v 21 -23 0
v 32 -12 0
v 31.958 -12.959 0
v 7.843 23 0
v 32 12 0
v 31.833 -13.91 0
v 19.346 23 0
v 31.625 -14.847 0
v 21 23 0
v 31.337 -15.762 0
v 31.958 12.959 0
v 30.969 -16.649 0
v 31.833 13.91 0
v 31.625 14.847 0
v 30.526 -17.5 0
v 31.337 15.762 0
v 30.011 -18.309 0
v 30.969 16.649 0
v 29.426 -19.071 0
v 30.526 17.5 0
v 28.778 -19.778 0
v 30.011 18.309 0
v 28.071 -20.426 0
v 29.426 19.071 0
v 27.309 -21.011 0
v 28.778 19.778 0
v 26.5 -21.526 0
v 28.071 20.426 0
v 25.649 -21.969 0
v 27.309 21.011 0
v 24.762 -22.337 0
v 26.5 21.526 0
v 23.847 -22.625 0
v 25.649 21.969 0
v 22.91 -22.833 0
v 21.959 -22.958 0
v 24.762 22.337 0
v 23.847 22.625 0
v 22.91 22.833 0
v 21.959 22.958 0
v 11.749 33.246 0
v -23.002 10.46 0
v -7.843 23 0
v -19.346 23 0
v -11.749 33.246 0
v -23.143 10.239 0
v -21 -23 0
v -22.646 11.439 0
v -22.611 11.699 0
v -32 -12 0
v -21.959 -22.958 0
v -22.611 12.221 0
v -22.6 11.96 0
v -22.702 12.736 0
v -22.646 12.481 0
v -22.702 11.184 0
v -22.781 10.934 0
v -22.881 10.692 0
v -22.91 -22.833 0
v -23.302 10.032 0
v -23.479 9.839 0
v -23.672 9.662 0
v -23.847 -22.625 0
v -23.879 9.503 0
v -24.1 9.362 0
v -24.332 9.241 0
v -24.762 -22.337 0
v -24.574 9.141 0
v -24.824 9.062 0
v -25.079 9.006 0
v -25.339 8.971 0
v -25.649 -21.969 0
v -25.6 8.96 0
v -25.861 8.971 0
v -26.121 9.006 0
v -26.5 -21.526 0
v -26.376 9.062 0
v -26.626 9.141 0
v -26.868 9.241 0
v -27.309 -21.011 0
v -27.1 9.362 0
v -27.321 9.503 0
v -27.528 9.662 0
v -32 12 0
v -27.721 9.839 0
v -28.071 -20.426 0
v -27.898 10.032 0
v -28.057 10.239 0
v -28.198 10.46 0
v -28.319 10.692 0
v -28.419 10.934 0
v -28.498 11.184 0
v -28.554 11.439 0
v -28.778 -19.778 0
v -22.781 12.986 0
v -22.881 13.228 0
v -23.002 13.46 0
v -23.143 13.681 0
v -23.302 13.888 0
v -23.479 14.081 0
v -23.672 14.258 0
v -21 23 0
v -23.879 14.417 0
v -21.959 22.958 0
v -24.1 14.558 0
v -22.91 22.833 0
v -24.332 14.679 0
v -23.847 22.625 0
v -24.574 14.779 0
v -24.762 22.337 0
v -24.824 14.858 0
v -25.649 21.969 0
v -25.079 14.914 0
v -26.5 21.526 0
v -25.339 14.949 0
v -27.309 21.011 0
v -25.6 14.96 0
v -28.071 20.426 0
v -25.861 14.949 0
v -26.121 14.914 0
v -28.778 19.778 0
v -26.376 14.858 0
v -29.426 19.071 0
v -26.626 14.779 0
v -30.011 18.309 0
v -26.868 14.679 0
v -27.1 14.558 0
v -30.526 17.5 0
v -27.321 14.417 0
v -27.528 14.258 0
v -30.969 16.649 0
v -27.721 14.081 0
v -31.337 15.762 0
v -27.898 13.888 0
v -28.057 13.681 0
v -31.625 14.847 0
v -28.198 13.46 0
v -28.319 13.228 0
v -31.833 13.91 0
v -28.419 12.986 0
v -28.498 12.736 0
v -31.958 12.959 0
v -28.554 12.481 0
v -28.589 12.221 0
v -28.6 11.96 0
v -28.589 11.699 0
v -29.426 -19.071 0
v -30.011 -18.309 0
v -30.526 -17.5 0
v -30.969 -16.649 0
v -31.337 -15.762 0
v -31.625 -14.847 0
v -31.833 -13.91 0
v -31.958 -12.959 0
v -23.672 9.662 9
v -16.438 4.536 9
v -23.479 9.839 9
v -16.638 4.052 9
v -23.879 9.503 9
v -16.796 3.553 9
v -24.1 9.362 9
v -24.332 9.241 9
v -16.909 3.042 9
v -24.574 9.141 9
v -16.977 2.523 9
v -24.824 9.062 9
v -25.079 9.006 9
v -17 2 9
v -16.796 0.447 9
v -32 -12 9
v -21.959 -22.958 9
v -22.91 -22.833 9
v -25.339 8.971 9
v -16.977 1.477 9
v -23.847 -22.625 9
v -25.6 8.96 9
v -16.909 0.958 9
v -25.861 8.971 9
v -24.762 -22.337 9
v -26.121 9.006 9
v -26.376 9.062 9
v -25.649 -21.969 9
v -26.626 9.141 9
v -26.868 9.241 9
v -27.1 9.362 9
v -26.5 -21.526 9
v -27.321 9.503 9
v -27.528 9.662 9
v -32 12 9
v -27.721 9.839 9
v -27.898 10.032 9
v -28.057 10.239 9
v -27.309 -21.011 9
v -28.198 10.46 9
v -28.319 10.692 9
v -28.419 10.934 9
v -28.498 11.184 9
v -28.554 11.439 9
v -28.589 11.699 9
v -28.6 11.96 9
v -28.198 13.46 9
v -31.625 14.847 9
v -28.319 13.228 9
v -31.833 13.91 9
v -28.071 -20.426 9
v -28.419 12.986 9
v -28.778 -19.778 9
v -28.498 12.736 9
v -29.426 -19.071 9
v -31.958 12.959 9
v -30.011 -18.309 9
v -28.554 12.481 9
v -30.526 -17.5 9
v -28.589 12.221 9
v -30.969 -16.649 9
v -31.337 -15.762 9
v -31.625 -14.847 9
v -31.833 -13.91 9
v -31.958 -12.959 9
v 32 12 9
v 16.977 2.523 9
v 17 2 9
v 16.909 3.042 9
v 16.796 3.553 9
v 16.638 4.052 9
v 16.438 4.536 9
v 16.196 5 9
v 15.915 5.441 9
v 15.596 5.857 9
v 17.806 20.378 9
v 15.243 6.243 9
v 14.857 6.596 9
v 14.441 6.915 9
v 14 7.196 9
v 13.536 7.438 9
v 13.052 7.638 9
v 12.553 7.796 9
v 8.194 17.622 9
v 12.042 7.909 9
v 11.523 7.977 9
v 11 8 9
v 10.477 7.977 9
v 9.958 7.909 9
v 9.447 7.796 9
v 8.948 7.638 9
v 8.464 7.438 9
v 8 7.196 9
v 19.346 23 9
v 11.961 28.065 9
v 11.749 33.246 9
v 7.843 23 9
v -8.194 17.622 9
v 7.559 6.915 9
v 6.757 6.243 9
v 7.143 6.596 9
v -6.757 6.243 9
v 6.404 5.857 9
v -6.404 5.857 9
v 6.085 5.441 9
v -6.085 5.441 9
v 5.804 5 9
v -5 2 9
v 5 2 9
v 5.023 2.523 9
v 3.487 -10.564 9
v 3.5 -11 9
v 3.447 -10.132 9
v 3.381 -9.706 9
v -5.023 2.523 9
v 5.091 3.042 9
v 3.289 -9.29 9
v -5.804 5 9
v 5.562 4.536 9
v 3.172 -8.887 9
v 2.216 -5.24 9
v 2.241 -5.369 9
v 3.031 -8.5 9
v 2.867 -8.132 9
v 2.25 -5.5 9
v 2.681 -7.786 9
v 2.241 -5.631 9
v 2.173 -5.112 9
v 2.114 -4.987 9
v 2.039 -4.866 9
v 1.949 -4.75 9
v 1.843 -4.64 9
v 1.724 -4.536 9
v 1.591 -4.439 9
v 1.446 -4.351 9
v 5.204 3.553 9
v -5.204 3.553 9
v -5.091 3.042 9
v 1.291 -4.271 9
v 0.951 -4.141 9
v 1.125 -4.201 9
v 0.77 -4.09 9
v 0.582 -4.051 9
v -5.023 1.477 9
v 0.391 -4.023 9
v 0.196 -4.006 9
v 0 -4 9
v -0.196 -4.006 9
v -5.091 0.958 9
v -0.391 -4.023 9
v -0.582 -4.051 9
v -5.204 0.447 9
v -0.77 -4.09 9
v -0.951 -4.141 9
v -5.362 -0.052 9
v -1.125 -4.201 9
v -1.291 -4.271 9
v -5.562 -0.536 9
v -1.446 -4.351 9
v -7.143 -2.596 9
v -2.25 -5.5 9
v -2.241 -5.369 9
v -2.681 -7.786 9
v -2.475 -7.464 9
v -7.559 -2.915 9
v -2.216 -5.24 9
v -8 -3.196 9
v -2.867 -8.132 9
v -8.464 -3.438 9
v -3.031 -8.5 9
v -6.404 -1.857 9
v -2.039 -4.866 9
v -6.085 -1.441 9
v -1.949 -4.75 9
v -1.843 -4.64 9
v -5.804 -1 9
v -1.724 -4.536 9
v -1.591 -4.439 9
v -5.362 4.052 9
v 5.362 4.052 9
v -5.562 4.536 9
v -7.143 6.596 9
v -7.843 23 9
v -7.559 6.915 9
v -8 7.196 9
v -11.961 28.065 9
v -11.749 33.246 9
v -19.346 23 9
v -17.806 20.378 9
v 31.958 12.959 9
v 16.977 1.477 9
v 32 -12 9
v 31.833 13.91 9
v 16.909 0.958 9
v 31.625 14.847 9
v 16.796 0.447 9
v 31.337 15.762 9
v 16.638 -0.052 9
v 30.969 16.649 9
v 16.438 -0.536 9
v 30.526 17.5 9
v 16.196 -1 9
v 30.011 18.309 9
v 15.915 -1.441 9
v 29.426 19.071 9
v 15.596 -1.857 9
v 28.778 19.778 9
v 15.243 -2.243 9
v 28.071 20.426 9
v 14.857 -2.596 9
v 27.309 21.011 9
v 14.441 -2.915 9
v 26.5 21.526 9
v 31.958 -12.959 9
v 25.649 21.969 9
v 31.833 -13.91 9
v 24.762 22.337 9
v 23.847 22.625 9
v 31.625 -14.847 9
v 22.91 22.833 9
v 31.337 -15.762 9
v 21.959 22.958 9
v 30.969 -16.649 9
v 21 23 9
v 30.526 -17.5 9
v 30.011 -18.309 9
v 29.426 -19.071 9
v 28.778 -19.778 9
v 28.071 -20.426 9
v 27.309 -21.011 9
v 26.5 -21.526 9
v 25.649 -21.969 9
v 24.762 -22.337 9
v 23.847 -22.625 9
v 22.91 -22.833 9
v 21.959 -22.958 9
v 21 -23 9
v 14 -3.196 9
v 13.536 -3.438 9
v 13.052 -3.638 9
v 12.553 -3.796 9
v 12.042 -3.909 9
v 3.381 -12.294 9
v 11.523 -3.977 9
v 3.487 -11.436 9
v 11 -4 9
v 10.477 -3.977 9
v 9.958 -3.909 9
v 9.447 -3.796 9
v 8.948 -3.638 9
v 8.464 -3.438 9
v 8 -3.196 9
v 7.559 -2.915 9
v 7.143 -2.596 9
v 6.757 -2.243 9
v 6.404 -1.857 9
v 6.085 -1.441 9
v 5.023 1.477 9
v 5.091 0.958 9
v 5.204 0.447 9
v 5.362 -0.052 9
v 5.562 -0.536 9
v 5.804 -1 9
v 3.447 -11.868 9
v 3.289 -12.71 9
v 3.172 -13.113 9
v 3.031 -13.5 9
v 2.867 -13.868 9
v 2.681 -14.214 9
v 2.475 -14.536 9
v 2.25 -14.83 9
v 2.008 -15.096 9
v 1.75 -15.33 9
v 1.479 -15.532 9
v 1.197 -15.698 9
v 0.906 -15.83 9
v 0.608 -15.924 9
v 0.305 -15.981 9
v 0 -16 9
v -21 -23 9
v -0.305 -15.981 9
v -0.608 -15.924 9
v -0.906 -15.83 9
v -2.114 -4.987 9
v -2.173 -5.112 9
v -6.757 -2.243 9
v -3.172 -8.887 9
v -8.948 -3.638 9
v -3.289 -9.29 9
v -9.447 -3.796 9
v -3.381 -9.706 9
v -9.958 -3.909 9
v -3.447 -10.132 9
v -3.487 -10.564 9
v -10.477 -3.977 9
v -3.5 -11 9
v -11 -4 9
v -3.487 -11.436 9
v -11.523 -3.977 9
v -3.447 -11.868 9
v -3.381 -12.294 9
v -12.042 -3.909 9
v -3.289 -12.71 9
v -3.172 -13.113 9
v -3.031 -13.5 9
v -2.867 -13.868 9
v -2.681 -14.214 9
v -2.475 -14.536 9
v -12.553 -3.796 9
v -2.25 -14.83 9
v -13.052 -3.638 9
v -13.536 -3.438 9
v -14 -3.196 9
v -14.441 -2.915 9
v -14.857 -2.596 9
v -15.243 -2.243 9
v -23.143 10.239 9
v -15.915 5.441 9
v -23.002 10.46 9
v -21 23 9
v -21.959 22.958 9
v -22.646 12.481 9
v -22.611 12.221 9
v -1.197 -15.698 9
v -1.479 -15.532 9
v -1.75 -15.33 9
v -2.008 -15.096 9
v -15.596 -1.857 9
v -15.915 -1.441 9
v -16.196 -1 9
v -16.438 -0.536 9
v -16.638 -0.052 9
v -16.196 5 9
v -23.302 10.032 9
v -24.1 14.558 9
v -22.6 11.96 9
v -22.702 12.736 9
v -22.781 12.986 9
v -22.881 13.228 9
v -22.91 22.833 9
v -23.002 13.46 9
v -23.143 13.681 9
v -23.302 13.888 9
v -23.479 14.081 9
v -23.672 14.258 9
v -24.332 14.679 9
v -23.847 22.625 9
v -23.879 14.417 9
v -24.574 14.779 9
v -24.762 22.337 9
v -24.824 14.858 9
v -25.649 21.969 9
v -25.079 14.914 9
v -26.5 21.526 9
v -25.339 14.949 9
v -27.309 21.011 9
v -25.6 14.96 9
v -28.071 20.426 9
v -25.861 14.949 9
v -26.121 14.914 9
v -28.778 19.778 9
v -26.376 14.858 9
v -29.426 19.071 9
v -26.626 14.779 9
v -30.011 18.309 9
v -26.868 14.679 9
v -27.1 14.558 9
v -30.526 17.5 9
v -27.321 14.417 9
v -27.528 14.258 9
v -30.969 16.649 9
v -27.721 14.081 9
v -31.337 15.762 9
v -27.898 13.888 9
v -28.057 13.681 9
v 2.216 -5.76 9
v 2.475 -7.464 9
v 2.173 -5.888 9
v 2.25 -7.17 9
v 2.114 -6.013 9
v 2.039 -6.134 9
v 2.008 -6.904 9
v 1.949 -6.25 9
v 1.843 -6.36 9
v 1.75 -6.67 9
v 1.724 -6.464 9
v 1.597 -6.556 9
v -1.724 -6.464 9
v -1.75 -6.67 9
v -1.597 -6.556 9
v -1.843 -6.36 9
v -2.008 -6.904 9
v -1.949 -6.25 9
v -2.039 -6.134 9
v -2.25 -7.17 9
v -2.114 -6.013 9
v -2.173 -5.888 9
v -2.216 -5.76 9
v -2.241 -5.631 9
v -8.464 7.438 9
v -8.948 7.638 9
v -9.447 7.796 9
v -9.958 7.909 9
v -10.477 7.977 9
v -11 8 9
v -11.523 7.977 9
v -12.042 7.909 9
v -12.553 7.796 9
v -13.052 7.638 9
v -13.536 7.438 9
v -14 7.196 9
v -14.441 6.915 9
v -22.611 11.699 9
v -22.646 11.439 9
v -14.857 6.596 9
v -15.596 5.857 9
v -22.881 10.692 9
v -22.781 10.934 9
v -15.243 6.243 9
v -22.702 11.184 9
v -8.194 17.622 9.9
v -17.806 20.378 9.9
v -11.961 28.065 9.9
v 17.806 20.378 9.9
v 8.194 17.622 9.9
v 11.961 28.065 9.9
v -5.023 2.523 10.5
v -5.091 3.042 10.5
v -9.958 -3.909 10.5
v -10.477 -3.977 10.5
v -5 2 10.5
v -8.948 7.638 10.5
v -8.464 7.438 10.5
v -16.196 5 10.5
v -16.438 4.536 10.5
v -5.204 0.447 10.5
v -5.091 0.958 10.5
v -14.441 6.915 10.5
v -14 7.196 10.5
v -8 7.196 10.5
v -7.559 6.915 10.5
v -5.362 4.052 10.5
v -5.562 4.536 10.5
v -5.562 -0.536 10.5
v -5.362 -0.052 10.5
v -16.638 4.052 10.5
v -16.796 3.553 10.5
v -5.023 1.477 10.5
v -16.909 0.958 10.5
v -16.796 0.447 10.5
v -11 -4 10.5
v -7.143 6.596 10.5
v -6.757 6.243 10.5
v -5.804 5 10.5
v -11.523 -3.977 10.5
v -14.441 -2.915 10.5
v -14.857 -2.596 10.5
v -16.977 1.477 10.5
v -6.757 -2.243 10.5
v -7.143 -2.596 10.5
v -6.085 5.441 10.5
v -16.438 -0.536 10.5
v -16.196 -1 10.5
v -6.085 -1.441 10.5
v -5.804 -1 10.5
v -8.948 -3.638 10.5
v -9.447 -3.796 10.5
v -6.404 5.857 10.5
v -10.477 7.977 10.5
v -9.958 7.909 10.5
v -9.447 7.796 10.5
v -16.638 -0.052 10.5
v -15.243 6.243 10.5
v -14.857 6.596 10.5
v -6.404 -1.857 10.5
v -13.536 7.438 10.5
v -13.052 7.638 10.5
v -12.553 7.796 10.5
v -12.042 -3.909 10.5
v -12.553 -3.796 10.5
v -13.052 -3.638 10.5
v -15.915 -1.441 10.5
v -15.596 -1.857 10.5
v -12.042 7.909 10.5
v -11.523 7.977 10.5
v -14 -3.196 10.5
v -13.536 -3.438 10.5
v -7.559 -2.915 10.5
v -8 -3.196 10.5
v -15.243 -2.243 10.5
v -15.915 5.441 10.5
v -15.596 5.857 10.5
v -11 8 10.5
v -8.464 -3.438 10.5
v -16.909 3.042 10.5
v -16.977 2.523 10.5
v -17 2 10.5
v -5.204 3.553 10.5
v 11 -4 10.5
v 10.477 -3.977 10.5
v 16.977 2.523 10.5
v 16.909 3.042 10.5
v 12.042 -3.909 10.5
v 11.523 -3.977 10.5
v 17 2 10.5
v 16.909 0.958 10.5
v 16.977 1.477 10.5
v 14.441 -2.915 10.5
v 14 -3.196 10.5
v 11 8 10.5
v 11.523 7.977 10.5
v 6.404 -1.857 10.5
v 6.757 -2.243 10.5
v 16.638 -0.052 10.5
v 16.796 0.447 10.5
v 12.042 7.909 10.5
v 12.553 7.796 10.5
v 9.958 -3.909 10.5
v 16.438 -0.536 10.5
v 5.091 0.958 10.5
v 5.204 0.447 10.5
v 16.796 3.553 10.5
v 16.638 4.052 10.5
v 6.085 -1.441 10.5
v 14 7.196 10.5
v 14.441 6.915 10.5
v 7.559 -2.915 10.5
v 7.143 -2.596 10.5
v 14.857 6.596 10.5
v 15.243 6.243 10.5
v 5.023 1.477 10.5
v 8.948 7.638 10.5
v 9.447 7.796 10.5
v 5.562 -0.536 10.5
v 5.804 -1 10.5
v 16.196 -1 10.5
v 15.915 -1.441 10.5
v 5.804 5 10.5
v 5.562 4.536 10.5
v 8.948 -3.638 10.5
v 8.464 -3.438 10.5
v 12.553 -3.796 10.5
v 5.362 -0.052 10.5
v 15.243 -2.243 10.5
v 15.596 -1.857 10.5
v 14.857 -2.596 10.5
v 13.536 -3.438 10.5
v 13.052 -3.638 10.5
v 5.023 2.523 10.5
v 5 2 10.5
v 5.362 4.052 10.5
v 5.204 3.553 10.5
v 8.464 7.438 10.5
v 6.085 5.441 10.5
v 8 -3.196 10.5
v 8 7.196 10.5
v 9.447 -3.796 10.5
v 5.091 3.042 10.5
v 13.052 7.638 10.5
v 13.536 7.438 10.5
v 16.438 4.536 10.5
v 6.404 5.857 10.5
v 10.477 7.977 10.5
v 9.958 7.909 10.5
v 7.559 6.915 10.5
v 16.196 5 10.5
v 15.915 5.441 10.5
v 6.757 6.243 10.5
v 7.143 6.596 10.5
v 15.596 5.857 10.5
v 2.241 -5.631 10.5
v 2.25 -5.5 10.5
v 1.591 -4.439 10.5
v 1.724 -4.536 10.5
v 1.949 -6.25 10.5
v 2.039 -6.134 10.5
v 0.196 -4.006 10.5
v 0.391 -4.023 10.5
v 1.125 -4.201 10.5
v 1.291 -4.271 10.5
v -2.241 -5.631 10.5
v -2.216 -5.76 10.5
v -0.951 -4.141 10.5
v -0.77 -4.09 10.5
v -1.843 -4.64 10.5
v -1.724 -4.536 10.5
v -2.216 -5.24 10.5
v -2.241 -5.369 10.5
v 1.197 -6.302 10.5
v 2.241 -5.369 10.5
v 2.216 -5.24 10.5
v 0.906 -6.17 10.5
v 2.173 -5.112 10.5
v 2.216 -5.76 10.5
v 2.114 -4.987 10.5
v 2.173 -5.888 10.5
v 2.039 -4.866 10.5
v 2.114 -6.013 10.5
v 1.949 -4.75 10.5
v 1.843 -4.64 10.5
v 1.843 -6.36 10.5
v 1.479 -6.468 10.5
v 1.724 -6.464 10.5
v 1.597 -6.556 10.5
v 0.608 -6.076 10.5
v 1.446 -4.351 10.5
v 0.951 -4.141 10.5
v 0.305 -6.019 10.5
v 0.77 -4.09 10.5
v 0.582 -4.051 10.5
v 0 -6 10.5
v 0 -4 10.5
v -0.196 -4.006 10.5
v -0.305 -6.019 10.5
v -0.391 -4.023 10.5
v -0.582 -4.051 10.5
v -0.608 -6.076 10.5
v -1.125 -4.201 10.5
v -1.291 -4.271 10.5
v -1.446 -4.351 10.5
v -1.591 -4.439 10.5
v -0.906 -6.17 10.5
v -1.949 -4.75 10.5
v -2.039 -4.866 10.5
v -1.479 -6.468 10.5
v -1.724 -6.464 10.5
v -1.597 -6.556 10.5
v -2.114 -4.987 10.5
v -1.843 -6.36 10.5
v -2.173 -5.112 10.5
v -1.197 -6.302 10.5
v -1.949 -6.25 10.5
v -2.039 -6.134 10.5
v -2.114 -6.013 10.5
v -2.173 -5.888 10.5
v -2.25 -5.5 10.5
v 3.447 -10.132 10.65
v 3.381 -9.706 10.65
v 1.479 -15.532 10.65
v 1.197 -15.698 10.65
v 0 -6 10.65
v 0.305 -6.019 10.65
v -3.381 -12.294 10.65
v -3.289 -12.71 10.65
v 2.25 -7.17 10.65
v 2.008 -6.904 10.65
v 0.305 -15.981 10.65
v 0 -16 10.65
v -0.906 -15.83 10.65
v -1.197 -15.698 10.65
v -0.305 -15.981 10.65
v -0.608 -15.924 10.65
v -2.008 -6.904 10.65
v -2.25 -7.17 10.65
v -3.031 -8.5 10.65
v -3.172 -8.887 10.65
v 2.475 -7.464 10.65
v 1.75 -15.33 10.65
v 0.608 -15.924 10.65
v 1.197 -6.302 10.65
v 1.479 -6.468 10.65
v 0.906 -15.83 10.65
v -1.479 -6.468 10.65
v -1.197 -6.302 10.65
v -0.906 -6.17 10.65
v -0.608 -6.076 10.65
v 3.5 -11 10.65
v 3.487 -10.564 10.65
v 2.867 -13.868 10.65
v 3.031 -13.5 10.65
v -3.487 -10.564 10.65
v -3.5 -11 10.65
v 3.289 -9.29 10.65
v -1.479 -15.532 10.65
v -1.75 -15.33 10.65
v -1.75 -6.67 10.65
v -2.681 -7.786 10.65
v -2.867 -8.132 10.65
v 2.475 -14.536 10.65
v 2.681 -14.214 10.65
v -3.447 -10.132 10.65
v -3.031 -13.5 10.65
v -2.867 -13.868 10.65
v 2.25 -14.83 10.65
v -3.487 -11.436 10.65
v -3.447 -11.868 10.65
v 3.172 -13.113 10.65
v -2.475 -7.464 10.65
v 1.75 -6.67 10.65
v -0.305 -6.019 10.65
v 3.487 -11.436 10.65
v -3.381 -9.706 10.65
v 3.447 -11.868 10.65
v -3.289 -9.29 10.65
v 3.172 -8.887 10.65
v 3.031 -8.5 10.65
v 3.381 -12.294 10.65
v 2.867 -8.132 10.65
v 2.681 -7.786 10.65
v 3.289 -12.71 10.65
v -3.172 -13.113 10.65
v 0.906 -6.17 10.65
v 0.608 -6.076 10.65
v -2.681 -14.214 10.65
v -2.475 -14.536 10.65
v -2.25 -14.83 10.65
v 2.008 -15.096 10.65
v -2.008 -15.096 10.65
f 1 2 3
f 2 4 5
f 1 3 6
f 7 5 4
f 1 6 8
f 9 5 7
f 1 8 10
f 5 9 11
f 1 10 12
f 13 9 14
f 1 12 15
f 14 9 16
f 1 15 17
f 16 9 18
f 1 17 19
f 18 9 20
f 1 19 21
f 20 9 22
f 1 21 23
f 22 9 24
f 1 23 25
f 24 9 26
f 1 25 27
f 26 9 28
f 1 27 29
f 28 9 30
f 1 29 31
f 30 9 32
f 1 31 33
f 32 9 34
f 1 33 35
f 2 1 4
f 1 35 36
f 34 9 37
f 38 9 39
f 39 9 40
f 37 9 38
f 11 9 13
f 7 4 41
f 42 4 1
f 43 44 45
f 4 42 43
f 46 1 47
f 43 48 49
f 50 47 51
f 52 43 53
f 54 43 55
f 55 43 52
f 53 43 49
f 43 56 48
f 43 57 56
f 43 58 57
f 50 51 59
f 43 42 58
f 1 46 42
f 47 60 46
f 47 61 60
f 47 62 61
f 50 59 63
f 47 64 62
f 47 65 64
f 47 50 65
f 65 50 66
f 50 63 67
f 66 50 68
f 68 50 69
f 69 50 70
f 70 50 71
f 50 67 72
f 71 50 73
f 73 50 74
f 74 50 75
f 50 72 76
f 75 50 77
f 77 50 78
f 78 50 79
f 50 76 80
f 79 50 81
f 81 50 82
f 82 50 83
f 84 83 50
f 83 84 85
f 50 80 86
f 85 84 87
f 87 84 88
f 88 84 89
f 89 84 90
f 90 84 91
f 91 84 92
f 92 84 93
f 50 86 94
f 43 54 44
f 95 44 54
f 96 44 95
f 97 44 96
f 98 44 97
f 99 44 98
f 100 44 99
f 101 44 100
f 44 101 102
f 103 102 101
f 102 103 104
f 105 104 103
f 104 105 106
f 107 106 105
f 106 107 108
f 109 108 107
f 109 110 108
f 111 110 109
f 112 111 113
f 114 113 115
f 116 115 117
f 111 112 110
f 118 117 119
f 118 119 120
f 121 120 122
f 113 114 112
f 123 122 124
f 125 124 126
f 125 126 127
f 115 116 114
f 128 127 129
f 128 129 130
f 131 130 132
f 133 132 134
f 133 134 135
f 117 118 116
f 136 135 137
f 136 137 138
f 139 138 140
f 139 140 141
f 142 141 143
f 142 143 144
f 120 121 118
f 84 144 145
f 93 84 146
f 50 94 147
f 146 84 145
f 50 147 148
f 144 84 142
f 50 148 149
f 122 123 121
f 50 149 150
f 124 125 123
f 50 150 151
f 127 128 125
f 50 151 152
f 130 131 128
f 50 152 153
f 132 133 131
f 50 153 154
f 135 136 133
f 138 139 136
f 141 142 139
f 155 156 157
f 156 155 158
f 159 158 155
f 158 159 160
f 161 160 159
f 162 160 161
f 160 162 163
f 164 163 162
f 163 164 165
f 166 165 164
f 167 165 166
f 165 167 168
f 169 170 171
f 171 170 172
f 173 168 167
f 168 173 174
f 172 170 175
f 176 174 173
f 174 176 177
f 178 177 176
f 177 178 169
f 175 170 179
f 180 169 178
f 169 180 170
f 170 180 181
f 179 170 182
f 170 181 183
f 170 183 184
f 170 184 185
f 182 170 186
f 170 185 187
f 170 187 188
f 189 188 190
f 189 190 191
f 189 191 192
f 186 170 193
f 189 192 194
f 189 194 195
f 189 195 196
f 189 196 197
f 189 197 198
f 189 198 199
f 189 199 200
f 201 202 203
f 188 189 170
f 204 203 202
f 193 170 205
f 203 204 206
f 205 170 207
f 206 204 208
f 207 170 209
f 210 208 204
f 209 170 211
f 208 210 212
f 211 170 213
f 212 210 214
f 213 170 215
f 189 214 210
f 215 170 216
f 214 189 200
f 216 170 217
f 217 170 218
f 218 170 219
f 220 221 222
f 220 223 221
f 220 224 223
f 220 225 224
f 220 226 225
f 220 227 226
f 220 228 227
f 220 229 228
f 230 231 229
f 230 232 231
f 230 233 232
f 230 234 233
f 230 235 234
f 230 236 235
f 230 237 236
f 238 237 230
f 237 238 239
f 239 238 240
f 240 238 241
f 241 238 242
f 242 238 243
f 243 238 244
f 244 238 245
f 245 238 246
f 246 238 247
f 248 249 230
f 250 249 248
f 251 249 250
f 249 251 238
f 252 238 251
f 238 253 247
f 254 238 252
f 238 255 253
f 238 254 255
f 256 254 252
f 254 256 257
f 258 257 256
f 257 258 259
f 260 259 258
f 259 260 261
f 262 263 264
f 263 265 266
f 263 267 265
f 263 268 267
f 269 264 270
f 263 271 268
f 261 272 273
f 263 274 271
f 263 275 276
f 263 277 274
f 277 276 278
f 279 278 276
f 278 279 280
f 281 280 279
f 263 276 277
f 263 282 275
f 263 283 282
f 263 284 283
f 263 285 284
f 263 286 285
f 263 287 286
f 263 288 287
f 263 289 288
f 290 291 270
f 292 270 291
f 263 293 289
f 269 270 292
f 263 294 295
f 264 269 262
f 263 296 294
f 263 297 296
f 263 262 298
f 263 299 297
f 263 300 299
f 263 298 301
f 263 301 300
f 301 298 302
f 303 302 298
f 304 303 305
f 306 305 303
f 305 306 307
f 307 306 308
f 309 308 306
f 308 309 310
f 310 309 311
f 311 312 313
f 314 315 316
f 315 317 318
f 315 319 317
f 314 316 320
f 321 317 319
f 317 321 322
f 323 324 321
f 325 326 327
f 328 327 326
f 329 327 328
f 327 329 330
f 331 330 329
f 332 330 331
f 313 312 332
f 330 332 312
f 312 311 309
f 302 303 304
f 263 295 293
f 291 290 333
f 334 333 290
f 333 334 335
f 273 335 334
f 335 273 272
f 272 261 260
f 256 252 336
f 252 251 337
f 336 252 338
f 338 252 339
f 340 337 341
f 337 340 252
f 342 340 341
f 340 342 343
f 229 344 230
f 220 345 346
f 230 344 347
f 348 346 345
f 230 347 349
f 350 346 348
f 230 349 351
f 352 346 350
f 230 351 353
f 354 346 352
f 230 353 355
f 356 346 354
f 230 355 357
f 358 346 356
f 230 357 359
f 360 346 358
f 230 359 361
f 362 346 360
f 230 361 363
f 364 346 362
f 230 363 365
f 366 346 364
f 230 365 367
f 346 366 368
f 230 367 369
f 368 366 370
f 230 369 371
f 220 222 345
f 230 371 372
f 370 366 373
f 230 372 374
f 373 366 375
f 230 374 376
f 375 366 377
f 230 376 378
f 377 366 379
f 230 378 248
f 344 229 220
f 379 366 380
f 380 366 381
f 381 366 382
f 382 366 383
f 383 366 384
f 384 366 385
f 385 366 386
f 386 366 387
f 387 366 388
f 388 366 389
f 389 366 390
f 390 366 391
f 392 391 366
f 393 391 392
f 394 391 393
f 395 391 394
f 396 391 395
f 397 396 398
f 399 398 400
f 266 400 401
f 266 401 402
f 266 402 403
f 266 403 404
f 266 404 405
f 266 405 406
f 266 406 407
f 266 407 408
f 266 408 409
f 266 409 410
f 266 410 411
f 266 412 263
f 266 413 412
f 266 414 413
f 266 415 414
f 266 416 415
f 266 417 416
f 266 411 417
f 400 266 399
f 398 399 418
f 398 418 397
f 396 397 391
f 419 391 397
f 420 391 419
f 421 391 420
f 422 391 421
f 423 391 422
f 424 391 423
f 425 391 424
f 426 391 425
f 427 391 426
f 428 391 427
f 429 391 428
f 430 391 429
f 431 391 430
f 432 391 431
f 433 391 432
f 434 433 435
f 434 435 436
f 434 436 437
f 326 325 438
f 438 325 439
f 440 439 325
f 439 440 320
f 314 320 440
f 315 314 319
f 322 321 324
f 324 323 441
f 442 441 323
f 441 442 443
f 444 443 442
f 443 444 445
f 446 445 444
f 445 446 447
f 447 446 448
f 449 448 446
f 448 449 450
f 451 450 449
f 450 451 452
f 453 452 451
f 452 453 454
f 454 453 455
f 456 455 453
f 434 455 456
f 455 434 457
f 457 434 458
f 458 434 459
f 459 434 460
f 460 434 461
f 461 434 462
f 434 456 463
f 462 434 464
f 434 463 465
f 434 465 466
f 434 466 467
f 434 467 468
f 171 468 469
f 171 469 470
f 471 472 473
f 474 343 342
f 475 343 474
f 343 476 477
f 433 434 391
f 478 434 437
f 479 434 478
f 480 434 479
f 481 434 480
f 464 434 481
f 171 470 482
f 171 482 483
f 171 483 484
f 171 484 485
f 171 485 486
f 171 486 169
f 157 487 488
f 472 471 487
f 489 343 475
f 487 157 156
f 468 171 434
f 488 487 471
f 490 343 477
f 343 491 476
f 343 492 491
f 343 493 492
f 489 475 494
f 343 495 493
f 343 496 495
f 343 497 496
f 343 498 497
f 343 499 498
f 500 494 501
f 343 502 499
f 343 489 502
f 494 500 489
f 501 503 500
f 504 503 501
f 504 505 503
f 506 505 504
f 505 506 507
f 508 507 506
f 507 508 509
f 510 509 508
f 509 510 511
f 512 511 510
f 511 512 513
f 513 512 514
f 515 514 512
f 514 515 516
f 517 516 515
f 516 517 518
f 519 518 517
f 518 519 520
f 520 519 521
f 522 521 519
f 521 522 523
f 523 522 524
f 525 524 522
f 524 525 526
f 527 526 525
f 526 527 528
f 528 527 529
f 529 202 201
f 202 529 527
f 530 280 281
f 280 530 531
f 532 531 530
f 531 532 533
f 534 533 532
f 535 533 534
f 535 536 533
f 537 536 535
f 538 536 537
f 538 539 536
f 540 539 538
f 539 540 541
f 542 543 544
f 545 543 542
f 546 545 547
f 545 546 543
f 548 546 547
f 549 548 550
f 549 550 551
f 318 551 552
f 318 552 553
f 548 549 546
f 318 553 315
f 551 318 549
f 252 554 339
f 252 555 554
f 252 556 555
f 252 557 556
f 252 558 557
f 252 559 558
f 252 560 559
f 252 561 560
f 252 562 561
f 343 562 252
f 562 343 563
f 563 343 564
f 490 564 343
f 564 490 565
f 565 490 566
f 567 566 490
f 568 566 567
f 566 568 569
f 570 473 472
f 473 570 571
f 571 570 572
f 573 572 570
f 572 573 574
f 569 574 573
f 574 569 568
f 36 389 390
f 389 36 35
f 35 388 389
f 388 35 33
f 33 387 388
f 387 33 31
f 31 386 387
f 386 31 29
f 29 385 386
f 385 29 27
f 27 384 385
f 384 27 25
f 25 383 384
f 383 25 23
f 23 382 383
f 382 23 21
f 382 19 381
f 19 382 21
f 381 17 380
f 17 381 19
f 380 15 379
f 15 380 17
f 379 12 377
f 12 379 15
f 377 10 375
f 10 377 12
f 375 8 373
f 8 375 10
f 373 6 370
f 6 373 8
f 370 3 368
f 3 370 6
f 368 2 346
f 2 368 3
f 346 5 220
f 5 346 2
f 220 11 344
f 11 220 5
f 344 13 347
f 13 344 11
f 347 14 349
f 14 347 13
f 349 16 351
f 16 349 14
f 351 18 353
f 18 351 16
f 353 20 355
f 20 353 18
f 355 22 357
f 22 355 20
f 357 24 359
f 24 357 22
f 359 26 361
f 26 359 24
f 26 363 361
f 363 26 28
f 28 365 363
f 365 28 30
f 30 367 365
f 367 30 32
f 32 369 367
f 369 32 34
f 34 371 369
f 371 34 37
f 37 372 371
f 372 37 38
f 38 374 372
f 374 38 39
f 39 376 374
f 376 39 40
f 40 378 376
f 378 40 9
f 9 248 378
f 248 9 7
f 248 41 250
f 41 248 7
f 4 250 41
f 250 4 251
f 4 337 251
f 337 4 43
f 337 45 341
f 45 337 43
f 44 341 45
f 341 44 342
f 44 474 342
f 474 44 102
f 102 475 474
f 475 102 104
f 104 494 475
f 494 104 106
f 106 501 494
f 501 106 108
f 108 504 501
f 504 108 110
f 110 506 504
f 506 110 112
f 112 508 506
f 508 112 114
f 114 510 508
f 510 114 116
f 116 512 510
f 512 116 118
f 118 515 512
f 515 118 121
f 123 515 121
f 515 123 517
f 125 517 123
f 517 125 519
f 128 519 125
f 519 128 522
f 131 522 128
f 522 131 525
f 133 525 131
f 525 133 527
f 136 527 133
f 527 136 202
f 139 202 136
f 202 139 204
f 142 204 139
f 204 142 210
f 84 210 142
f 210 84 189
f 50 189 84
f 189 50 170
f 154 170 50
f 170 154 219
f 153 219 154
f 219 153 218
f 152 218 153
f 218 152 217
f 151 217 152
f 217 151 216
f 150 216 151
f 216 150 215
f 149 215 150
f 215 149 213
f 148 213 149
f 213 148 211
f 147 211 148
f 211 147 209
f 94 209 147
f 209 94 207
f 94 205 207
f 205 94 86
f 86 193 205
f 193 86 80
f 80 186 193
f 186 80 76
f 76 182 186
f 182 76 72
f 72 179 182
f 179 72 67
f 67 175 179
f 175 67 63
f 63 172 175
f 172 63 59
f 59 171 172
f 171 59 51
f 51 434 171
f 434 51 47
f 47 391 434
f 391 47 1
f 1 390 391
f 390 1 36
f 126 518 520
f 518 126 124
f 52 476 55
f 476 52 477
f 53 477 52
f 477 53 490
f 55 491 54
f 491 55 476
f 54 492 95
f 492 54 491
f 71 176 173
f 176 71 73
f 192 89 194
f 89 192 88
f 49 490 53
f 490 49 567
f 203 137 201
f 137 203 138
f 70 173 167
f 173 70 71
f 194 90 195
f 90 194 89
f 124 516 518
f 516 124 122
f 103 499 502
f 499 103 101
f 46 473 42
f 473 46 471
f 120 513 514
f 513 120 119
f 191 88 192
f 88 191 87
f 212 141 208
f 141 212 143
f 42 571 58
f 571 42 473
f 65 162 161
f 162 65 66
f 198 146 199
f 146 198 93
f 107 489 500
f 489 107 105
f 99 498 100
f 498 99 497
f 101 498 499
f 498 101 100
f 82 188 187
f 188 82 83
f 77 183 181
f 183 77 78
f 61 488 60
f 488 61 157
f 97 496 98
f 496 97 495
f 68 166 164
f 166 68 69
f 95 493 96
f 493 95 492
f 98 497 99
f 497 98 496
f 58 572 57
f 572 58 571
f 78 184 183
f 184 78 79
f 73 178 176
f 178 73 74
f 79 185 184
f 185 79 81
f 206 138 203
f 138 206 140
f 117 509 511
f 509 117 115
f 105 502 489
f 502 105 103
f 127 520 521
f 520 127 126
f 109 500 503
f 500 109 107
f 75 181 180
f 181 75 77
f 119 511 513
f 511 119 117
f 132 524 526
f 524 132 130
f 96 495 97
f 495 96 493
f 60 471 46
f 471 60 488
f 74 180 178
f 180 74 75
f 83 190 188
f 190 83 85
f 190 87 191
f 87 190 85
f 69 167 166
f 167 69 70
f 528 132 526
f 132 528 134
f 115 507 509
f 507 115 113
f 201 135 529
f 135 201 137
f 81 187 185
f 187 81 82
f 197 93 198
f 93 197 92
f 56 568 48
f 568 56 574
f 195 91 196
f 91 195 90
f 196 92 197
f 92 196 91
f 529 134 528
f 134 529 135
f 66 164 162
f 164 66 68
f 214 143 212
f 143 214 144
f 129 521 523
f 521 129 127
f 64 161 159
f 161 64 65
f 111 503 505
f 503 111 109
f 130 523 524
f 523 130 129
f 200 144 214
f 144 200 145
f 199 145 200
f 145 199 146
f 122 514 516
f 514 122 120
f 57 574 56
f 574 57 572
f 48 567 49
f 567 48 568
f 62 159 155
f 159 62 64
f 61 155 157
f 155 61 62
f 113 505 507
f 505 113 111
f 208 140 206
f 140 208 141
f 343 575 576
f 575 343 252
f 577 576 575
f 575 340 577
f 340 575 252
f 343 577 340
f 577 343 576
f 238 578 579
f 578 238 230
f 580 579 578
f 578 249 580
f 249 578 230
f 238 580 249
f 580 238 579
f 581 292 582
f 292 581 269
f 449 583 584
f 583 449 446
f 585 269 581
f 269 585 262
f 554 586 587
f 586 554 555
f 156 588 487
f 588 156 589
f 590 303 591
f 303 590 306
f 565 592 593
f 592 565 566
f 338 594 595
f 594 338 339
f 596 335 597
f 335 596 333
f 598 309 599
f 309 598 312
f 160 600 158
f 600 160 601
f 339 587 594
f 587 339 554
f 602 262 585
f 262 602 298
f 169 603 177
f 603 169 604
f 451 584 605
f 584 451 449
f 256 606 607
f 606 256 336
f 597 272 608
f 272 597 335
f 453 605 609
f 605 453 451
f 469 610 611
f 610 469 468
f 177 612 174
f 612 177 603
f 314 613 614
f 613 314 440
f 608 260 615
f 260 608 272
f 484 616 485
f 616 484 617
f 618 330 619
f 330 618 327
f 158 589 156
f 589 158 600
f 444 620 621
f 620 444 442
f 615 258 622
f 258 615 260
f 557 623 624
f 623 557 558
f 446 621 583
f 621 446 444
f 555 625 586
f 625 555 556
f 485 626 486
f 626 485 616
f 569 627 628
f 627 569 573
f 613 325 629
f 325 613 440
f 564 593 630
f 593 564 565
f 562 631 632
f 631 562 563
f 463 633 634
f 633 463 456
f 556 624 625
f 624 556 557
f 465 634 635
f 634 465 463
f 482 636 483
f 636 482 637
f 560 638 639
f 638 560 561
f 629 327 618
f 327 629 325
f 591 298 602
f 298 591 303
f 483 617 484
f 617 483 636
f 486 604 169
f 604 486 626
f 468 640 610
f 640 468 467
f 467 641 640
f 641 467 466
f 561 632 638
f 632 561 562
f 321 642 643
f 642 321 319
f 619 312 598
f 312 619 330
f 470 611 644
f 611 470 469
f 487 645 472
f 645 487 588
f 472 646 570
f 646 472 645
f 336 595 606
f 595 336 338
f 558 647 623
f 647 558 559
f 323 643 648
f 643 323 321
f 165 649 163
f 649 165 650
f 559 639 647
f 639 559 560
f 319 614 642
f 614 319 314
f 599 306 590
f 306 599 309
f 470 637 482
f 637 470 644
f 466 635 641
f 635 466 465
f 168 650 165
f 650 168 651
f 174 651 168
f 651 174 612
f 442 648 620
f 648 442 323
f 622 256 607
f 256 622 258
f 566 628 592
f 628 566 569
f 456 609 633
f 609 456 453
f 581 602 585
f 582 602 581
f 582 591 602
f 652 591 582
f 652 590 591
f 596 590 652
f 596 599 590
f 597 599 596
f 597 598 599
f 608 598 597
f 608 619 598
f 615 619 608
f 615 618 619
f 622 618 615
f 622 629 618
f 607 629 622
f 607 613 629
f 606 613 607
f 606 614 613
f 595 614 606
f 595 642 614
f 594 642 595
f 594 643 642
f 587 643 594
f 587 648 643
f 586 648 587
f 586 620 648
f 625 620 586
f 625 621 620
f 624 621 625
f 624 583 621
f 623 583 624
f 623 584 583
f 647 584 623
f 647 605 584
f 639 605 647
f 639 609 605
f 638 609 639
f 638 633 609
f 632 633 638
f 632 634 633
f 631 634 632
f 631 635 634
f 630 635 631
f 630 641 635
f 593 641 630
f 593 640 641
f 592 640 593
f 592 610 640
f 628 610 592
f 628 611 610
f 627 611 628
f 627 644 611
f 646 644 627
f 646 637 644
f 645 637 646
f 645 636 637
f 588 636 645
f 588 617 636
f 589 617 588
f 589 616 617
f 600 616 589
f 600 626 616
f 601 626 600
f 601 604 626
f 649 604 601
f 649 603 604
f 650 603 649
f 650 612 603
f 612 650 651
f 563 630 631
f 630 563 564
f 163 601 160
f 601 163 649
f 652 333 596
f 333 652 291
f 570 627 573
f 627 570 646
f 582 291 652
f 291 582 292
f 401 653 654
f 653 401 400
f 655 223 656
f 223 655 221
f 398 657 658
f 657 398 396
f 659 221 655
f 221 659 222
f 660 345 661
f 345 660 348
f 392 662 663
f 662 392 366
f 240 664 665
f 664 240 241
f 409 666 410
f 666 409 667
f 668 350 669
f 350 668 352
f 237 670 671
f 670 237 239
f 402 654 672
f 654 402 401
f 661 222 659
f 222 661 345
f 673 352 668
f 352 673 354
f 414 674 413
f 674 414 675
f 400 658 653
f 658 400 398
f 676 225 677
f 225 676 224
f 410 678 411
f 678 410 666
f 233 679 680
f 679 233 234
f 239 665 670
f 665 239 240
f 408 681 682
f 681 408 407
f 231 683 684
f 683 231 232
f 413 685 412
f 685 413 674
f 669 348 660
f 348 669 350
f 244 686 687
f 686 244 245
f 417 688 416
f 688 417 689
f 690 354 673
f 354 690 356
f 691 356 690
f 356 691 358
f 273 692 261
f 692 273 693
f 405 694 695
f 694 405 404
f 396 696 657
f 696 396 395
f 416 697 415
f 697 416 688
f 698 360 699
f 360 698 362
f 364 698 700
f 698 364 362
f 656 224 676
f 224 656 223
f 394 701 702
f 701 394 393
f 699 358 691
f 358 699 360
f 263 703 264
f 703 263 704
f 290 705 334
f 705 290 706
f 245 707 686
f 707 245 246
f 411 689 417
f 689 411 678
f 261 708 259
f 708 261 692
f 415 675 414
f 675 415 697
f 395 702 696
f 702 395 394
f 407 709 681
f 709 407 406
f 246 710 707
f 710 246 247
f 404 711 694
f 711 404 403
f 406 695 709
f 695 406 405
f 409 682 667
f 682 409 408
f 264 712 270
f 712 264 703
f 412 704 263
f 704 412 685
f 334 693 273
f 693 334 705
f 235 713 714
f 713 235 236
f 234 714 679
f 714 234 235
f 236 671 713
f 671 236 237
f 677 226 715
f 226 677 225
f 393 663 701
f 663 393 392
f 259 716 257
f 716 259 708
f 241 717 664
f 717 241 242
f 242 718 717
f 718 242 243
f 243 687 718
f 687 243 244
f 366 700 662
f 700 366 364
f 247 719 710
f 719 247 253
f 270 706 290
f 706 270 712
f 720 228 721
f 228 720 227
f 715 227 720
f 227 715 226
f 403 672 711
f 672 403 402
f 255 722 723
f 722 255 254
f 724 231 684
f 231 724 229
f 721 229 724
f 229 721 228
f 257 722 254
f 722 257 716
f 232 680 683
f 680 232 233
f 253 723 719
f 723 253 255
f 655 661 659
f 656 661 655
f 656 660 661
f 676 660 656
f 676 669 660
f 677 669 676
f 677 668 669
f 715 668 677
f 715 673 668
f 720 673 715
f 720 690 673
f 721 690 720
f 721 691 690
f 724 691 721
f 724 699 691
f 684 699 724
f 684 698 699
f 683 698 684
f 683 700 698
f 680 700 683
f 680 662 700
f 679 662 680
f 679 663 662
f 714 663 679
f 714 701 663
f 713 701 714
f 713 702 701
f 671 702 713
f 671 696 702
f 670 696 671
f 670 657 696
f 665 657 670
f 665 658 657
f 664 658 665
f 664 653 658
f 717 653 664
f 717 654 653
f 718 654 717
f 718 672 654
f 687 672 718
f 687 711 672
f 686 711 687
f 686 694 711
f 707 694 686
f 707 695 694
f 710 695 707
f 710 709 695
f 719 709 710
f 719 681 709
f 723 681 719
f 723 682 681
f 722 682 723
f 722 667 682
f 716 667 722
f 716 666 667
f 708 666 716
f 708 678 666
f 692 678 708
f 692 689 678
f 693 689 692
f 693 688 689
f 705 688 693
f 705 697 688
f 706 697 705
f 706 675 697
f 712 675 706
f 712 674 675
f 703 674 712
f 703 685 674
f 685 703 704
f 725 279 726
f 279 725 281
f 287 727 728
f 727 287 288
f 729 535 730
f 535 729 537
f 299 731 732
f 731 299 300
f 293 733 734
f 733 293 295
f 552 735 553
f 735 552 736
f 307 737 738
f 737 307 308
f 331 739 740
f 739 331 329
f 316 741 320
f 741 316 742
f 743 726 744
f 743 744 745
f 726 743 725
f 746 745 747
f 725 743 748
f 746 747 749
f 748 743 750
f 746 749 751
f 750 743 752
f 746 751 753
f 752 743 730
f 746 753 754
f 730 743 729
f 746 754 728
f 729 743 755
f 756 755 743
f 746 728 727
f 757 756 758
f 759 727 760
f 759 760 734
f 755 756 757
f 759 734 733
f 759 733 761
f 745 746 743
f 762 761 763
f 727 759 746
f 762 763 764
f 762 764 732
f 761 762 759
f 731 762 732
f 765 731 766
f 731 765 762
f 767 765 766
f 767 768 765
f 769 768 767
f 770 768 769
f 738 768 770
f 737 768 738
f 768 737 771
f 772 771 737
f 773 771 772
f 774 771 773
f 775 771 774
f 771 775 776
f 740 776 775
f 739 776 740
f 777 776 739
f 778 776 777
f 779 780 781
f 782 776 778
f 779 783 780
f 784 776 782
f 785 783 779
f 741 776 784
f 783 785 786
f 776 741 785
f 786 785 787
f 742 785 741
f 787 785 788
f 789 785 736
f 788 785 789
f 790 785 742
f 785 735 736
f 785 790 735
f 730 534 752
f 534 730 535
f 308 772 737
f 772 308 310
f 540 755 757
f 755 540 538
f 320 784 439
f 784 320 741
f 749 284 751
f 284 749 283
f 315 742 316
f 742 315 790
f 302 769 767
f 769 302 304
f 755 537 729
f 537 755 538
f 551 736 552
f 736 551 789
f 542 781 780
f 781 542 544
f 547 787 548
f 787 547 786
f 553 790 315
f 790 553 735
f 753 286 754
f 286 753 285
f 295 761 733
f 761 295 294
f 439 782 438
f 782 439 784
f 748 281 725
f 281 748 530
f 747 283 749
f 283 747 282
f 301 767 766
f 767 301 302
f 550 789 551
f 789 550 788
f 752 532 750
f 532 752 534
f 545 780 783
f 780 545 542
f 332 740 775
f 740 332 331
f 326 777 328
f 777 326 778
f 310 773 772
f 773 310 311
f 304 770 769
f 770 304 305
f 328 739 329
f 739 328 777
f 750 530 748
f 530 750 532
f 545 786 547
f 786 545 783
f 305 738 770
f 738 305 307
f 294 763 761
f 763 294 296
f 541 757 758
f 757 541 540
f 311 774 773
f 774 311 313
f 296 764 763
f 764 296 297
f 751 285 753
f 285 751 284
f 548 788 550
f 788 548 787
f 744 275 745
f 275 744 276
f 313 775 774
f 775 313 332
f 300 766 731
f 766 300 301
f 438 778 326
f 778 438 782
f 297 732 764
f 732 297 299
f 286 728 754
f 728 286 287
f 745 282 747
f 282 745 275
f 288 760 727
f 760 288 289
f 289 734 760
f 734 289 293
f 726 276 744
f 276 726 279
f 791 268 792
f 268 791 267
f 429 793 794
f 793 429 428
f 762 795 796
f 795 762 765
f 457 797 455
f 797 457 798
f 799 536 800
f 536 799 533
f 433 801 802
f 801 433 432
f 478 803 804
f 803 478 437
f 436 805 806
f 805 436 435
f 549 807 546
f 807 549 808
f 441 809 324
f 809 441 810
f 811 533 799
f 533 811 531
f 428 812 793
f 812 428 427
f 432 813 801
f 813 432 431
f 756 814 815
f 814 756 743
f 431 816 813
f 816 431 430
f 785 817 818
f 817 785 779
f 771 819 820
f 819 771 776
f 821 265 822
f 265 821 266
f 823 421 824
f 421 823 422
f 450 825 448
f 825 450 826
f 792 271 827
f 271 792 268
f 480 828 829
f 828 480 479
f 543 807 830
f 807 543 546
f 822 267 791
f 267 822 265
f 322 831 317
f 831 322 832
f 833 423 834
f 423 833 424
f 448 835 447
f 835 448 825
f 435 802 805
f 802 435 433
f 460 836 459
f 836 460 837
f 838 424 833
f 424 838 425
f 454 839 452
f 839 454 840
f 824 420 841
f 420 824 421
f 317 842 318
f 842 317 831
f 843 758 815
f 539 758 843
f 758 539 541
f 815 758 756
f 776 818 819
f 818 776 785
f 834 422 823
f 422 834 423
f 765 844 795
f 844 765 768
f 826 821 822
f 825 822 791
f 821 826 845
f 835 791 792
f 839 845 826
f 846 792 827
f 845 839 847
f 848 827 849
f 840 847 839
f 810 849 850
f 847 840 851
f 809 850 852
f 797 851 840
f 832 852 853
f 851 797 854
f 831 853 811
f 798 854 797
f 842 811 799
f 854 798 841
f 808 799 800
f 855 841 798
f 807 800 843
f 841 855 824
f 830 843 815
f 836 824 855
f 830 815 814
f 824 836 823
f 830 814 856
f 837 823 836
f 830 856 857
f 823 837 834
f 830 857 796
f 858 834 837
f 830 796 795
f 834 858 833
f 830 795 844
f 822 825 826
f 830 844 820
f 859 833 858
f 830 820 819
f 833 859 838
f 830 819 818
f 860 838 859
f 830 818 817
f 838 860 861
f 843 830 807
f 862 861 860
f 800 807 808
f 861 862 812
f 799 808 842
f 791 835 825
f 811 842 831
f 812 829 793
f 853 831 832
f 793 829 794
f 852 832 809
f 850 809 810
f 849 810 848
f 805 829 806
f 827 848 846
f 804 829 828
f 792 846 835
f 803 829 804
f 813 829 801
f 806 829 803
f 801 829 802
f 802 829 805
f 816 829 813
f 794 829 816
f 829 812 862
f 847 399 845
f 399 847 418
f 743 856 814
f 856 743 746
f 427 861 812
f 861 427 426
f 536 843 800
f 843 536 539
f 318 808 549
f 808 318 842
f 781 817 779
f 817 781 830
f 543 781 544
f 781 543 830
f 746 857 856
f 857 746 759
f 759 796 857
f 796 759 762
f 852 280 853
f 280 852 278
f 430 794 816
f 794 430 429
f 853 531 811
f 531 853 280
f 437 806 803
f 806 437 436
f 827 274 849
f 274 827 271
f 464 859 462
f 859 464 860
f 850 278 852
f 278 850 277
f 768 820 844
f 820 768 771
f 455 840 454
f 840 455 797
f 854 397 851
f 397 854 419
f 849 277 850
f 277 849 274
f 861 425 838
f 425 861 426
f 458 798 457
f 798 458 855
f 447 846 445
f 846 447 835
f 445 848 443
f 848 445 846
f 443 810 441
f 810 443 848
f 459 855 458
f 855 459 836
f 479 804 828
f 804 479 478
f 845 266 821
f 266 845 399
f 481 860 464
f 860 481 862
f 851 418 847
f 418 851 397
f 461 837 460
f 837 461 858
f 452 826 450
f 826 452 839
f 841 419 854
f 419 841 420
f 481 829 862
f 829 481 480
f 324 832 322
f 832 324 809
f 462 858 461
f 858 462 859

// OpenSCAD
// ============================================================
//  LuxeStyle - Flacher Kawaii-Katzen-Charm, RUNDE Augen (kein X)
//  Mehrfarbig (AMS): weiss + rosa Ohren, schwarze runde Augen + Nase,
//  orange Zunge. Mit Schluesselring-Loch. Flach/taschentauglich.
//  Rendern: openscad -o cat_charm_round.stl cat_charm_round.scad
// ============================================================

length = 64;   // mm
width  = 46;   // mm
thick  = 9;    // Dicke mm
edge_r = 11;
ring_d = 6;
eye_dx = 11;   // Augenabstand
eye_y  = 2;
eye_d  = 12;   // Augendurchmesser
emb    = 1.5;  // Erhebung der Farbteile
$fn = 72;

module body2d() {
    union() {
        offset(edge_r) offset(-edge_r) square([length, width], center = true);
        for (s = [-1, 1]) translate([s * 13, width / 2 - 5]) rotate(s * 16)
            polygon([[-9, -1], [9, -1], [s * 3, 15]]);   // Ohren
    }
}

// ---- weisser Koerper + Loch (oben links) ----
color("white")
difference() {
    linear_extrude(thick) body2d();
    translate([-length * 0.40, width * 0.26, -1]) cylinder(d = ring_d, h = thick + 2);
}

// ---- rosa Ohr-Innenseiten ----
color([1, 0.72, 0.76])
for (s = [-1, 1]) translate([s * 13, width / 2 - 4, thick])
    linear_extrude(emb * 0.6) rotate(s * 16) polygon([[-5, 0], [5, 0], [s * 1.5, 9]]);

// ---- schwarze runde Augen ----
color("black")
for (s = [-1, 1]) translate([s * eye_dx, eye_y, thick])
    linear_extrude(emb) circle(d = eye_d);

// ---- kleine schwarze Nase ----
color("black")
translate([0, eye_y - 7.5, thick]) linear_extrude(emb) resize([4.5, 3]) circle(d = 10);

// ---- orange Zunge (haengt raus) ----
color("orange")
translate([0, eye_y - 13, thick]) linear_extrude(emb * 1.1) resize([7, 10]) circle(d = 20);
